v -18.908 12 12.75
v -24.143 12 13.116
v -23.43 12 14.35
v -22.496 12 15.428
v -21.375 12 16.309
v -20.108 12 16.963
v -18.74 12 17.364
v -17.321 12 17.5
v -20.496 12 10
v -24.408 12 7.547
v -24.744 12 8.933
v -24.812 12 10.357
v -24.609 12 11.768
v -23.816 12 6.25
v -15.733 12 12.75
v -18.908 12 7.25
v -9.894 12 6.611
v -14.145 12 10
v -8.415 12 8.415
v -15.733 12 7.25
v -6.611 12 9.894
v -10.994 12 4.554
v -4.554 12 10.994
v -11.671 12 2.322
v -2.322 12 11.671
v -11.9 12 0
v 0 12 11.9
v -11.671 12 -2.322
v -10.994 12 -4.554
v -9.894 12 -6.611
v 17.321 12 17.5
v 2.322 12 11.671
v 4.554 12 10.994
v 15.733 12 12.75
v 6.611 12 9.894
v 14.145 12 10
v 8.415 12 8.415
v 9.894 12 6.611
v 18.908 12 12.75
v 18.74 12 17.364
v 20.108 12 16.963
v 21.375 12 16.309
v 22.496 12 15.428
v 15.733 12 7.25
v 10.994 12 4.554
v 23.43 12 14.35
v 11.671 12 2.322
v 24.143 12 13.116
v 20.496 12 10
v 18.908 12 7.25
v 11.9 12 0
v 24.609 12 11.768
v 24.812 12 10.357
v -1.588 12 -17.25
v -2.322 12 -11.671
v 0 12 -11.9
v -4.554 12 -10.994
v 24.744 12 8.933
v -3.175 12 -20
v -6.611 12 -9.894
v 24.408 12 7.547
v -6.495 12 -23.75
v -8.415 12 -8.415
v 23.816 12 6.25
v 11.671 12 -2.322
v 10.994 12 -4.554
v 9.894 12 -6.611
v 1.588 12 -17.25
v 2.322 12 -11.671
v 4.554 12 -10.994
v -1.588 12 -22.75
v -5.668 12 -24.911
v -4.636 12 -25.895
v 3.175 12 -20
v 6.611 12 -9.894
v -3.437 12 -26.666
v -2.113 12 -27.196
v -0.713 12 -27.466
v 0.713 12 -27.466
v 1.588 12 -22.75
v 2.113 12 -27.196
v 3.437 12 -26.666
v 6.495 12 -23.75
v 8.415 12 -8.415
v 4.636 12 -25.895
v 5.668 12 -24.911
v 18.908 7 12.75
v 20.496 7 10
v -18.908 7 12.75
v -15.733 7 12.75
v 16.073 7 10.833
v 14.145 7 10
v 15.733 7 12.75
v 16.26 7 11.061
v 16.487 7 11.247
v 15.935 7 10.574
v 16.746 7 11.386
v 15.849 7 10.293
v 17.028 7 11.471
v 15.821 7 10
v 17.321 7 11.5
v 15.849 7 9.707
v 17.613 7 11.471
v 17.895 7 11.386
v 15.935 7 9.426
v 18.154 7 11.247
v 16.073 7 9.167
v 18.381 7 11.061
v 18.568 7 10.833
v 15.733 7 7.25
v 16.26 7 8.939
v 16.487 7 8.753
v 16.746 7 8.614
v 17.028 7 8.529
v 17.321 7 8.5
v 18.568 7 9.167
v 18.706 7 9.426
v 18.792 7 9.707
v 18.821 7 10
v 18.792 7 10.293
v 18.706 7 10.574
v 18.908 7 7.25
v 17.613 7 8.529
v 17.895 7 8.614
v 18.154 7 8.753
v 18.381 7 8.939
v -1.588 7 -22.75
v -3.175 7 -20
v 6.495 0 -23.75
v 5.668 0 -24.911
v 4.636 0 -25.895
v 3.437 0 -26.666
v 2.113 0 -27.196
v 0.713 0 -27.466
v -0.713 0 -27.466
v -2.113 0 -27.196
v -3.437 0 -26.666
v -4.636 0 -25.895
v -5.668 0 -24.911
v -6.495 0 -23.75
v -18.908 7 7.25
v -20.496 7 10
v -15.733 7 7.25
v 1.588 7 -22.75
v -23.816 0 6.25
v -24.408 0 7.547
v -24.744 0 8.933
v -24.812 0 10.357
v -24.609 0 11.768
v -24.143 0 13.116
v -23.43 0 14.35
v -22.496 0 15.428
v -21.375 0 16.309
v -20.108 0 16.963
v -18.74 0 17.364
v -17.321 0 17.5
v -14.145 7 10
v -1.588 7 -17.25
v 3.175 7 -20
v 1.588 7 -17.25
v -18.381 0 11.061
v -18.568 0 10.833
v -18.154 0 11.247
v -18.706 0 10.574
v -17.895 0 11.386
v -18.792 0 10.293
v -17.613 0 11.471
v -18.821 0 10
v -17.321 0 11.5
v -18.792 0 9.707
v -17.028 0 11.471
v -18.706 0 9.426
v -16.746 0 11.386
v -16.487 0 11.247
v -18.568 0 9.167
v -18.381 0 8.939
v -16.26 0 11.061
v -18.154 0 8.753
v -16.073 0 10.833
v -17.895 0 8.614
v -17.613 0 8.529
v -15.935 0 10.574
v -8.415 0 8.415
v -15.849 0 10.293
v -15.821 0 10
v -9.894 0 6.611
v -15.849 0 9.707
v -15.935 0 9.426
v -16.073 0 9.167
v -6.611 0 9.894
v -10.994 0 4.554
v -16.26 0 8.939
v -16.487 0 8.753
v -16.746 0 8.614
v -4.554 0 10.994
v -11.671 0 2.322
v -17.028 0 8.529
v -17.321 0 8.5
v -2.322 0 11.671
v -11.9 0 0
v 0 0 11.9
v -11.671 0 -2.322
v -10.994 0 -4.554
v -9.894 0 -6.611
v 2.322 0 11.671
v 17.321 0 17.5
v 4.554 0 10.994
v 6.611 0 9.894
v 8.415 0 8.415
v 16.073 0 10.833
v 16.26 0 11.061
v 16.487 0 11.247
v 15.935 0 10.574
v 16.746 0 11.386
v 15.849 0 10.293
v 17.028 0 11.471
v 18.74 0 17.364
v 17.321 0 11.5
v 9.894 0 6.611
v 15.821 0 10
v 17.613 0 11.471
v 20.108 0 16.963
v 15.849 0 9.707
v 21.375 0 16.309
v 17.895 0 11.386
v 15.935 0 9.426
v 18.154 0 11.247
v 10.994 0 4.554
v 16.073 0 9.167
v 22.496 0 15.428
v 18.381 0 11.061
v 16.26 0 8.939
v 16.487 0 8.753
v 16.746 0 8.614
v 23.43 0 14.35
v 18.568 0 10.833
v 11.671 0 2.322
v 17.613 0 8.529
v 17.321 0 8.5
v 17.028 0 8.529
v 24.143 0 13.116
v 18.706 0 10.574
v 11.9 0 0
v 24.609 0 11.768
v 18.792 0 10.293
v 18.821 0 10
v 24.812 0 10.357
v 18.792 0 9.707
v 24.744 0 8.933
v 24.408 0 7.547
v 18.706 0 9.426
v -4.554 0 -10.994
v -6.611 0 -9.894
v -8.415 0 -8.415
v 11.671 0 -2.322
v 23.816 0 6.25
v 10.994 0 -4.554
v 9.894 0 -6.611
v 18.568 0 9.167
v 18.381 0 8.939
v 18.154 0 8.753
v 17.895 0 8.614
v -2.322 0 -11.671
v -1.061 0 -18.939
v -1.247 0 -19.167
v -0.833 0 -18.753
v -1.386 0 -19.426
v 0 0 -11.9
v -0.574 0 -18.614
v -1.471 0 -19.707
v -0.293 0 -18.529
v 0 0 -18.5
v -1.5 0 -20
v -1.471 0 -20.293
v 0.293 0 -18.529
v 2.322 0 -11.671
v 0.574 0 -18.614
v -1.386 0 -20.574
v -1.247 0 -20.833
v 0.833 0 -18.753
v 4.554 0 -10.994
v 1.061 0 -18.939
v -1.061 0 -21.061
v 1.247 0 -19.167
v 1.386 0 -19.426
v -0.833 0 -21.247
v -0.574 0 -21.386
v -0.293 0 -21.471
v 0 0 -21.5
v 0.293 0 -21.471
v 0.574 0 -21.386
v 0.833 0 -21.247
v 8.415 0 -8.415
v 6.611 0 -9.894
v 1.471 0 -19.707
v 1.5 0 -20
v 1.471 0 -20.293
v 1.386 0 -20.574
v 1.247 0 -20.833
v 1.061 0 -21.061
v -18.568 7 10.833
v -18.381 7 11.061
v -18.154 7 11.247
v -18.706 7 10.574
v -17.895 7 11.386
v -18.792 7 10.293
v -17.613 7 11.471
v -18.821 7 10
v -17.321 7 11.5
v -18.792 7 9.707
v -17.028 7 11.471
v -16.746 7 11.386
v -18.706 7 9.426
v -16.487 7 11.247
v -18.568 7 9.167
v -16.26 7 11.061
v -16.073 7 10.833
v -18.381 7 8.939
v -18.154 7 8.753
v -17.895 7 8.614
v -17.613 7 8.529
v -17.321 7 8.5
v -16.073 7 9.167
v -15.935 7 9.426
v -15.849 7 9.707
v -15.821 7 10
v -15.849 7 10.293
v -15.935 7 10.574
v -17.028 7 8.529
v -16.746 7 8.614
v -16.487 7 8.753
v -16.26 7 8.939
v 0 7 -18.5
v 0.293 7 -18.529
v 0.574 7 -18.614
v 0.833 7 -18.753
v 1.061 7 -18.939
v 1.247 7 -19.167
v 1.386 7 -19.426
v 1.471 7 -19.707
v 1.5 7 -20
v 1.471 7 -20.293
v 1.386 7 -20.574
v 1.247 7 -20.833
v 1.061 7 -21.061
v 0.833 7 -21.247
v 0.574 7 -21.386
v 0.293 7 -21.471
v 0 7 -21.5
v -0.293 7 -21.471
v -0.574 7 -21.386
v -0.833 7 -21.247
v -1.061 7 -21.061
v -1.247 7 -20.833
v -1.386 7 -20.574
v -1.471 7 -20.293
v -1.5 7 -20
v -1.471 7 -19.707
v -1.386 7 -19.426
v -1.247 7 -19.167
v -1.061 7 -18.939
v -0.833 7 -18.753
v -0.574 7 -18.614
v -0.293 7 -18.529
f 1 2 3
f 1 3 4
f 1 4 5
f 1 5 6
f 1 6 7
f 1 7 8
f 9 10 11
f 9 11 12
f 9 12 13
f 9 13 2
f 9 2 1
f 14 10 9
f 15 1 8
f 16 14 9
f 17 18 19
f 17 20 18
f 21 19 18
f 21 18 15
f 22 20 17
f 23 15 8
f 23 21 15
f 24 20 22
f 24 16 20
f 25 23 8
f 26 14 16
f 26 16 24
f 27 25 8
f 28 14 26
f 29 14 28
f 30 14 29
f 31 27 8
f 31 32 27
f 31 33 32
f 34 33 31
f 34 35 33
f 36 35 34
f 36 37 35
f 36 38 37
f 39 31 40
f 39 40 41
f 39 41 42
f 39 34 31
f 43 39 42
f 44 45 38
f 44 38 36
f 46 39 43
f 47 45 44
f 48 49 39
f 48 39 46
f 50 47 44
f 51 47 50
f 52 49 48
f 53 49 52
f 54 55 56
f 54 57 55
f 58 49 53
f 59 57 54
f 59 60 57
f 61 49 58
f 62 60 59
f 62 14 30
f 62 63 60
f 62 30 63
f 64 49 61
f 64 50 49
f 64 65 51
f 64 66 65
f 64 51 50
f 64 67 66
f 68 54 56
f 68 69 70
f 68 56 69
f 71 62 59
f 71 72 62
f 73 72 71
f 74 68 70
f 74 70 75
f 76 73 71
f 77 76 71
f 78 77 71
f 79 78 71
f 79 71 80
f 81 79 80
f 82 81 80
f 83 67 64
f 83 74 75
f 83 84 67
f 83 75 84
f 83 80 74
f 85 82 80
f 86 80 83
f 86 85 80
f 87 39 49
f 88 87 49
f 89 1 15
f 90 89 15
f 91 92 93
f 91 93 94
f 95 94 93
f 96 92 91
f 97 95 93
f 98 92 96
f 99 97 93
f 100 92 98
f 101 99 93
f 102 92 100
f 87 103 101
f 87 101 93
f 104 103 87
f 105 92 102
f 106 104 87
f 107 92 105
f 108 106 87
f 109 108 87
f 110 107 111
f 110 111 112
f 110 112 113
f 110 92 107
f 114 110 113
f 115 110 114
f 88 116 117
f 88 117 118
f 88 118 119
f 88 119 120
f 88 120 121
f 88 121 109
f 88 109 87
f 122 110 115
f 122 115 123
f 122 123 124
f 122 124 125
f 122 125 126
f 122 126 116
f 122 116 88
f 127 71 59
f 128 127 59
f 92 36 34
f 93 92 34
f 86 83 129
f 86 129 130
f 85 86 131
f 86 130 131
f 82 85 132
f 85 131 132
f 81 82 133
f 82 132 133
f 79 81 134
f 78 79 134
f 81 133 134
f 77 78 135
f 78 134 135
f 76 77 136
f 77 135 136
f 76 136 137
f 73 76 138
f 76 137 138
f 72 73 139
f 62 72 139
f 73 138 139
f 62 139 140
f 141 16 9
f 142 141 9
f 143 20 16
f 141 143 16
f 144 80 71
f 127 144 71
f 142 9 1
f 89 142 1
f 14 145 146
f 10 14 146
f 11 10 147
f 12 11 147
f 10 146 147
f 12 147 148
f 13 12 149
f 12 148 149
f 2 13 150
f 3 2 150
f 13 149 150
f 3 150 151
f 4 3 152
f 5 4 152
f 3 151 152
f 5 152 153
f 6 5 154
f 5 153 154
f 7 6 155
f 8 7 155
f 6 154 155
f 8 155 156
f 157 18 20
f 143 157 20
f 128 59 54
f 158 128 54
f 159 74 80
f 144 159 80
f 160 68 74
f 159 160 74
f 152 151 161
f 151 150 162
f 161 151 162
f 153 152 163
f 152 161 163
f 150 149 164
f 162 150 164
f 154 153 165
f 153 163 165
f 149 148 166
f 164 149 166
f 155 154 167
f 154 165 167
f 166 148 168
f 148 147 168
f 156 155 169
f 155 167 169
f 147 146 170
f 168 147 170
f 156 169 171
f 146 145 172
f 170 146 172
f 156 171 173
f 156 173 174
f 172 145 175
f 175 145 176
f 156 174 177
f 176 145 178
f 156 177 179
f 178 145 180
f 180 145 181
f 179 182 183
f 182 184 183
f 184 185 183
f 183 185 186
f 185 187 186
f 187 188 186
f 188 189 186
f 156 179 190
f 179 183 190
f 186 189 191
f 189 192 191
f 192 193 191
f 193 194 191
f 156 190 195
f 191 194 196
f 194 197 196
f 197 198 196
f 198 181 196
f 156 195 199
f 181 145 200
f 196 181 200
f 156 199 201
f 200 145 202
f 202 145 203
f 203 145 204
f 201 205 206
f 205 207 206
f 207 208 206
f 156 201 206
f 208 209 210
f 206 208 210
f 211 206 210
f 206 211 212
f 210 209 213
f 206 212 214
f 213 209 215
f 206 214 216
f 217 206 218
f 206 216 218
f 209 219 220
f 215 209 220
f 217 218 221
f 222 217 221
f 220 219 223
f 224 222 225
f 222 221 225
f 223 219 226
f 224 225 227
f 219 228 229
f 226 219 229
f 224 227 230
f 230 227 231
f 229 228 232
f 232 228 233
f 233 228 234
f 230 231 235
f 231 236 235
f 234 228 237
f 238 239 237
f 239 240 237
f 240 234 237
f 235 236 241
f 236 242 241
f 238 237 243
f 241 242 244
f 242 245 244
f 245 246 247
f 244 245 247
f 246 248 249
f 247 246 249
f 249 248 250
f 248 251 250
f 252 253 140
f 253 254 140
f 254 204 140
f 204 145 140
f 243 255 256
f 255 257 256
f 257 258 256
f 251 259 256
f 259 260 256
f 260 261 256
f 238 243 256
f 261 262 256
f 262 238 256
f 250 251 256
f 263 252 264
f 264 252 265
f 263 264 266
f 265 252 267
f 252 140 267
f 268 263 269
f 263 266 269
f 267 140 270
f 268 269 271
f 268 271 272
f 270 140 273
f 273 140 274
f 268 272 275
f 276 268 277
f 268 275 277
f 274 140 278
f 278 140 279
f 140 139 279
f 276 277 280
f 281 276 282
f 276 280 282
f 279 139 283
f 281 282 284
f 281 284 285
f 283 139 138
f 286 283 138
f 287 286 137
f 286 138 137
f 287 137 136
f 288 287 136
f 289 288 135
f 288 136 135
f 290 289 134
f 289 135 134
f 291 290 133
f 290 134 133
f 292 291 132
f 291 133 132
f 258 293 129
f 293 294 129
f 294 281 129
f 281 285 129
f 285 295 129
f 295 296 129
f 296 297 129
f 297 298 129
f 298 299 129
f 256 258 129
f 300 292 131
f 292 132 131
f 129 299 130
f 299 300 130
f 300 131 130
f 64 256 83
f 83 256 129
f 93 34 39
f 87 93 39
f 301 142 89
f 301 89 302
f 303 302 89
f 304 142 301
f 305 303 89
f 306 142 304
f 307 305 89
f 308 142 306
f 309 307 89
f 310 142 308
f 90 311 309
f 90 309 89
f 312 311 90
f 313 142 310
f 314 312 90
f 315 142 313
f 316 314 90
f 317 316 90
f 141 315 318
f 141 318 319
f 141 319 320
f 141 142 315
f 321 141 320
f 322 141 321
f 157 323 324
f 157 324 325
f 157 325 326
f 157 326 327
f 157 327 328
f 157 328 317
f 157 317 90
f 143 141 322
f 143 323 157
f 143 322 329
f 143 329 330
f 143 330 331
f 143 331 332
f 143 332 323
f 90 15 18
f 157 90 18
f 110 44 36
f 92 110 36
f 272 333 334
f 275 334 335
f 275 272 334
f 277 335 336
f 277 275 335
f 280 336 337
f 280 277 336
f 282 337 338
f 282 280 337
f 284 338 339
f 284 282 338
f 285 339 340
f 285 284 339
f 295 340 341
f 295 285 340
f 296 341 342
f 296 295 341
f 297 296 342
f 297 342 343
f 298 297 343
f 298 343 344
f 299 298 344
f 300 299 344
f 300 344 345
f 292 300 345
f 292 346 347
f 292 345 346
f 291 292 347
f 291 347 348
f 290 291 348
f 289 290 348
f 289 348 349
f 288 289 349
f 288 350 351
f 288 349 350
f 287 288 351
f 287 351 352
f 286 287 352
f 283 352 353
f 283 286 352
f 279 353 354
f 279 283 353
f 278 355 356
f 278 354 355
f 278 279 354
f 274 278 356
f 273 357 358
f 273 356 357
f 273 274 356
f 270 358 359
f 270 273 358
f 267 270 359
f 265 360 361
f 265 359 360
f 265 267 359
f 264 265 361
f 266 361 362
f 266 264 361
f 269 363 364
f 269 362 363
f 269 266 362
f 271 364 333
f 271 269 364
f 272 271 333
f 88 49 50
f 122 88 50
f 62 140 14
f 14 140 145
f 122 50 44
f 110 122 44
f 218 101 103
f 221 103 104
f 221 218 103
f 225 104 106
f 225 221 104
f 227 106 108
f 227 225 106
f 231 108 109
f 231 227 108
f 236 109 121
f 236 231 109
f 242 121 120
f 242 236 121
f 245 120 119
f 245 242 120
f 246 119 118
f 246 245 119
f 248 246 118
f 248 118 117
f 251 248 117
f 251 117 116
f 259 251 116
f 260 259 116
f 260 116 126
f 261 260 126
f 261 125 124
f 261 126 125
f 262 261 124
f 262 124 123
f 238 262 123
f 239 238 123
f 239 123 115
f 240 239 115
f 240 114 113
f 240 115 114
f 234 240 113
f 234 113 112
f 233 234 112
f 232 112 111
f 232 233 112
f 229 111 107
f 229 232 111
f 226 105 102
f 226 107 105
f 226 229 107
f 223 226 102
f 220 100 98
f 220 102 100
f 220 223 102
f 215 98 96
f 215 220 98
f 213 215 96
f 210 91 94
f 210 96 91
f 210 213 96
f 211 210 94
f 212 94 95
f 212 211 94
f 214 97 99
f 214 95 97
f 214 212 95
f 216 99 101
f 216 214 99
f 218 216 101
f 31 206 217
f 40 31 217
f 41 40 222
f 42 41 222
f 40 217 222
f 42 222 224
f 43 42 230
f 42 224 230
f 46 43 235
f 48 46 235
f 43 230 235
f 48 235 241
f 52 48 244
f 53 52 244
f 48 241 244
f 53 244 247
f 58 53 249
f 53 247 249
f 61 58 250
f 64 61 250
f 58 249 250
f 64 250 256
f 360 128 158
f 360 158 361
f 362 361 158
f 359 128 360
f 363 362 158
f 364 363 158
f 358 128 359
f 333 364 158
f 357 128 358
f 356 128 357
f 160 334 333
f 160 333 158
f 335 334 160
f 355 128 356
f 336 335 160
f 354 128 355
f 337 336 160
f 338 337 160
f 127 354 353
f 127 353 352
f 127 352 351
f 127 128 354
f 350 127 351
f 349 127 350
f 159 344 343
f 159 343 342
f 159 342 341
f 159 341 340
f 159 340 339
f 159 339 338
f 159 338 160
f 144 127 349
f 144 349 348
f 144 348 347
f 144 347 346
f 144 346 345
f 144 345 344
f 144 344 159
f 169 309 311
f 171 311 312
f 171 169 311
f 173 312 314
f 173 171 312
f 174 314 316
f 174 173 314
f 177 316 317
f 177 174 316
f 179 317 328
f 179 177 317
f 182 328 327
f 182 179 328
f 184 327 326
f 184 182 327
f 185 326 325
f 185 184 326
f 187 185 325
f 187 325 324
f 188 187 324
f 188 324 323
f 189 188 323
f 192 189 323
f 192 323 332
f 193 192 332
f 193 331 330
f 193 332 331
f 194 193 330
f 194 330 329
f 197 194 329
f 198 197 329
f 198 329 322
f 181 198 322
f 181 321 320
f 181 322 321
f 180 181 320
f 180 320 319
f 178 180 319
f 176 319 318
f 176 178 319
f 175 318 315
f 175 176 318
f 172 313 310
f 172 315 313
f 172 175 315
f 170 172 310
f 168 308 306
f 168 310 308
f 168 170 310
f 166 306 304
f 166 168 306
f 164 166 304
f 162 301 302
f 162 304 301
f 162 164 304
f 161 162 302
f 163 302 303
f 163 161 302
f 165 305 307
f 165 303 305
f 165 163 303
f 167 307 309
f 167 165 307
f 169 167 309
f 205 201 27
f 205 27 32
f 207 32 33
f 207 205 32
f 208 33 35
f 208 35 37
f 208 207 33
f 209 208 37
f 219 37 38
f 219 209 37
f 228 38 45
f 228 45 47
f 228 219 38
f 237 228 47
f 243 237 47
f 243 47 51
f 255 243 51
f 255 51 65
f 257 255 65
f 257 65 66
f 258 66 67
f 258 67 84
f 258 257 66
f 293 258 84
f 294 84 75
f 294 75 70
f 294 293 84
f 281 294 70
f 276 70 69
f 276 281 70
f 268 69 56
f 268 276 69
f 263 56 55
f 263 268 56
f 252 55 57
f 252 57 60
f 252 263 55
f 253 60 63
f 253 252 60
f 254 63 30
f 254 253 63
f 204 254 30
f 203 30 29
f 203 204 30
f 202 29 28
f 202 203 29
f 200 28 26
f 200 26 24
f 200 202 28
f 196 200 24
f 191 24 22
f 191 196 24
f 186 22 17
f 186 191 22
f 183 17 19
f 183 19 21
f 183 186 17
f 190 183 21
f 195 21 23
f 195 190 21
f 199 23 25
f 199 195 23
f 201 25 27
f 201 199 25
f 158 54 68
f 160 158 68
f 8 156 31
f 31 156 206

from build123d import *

# Parameters (mm, degrees)
ESQUISSE1_R             = 11.9
ESQUISSE1_R_2           = 1.5
BOSS_EXTRU_1_DEPTH      = 12
ENL_V_MAT_EXTRU_1_DEPTH = 5


with BuildPart() as part:
    # Esquisse1 → Boss.-Extru.1 (new body)
    with BuildSketch(Plane(origin=(0, 0, 0), x_dir=(1, 0, 0), z_dir=(0, 1, 0))):
        with BuildLine():
            Line((-6.495190528, 23.75), (-23.815698604, -6.25))
            ThreePointArc((-23.815698604, -6.25), (-23.815698604, -13.75), (-17.320508076, -17.5))
            Line((-17.320508076, -17.5), (17.320508076, -17.5))
            ThreePointArc((17.320508076, -17.5), (23.815698604, -13.75), (23.815698604, -6.25))
            Line((23.815698604, -6.25), (6.495190528, 23.75))
            ThreePointArc((6.495190528, 23.75), (0, 27.5), (-6.495190528, 23.75))
        make_face()
        with Locations(Location((0, 0, 0), (0, 0, 270))):
            Circle(ESQUISSE1_R, mode=Mode.SUBTRACT)
        with Locations(Location((-17.320508076, -10, 0), (0, 0, 270))):
            Circle(ESQUISSE1_R_2, mode=Mode.SUBTRACT)
        with Locations(Location((0, 20, 0), (0, 0, 270))):
            Circle(ESQUISSE1_R_2, mode=Mode.SUBTRACT)
        with Locations(Location((17.320508076, -10, 0), (0, 0, 270))):
            Circle(ESQUISSE1_R_2, mode=Mode.SUBTRACT)
    extrude(amount=BOSS_EXTRU_1_DEPTH)

    # Esquisse2 → Enlèv. mat.-Extru.1 (cut)
    with BuildSketch(Plane(origin=(0, 12, 0), x_dir=(1, 0, 0), z_dir=(0, 1, 0))):
        Polygon((-18.908221316, -7.25), (-20.495934556, -10), (-18.908221316, -12.75), (-15.732794835, -12.75), (-14.145081595, -10), (-15.732794835, -7.25), align=None)
        Polygon((-1.58771324, 22.75), (-3.175426481, 20), (-1.58771324, 17.25), (1.58771324, 17.25), (3.175426481, 20), (1.58771324, 22.75), align=None)
        Polygon((18.908221316, -7.25), (15.732794835, -7.25), (14.145081595, -10), (15.732794835, -12.75), (18.908221316, -12.75), (20.495934556, -10), align=None)
    extrude(amount=-ENL_V_MAT_EXTRU_1_DEPTH, mode=Mode.SUBTRACT)


solid = part.part
